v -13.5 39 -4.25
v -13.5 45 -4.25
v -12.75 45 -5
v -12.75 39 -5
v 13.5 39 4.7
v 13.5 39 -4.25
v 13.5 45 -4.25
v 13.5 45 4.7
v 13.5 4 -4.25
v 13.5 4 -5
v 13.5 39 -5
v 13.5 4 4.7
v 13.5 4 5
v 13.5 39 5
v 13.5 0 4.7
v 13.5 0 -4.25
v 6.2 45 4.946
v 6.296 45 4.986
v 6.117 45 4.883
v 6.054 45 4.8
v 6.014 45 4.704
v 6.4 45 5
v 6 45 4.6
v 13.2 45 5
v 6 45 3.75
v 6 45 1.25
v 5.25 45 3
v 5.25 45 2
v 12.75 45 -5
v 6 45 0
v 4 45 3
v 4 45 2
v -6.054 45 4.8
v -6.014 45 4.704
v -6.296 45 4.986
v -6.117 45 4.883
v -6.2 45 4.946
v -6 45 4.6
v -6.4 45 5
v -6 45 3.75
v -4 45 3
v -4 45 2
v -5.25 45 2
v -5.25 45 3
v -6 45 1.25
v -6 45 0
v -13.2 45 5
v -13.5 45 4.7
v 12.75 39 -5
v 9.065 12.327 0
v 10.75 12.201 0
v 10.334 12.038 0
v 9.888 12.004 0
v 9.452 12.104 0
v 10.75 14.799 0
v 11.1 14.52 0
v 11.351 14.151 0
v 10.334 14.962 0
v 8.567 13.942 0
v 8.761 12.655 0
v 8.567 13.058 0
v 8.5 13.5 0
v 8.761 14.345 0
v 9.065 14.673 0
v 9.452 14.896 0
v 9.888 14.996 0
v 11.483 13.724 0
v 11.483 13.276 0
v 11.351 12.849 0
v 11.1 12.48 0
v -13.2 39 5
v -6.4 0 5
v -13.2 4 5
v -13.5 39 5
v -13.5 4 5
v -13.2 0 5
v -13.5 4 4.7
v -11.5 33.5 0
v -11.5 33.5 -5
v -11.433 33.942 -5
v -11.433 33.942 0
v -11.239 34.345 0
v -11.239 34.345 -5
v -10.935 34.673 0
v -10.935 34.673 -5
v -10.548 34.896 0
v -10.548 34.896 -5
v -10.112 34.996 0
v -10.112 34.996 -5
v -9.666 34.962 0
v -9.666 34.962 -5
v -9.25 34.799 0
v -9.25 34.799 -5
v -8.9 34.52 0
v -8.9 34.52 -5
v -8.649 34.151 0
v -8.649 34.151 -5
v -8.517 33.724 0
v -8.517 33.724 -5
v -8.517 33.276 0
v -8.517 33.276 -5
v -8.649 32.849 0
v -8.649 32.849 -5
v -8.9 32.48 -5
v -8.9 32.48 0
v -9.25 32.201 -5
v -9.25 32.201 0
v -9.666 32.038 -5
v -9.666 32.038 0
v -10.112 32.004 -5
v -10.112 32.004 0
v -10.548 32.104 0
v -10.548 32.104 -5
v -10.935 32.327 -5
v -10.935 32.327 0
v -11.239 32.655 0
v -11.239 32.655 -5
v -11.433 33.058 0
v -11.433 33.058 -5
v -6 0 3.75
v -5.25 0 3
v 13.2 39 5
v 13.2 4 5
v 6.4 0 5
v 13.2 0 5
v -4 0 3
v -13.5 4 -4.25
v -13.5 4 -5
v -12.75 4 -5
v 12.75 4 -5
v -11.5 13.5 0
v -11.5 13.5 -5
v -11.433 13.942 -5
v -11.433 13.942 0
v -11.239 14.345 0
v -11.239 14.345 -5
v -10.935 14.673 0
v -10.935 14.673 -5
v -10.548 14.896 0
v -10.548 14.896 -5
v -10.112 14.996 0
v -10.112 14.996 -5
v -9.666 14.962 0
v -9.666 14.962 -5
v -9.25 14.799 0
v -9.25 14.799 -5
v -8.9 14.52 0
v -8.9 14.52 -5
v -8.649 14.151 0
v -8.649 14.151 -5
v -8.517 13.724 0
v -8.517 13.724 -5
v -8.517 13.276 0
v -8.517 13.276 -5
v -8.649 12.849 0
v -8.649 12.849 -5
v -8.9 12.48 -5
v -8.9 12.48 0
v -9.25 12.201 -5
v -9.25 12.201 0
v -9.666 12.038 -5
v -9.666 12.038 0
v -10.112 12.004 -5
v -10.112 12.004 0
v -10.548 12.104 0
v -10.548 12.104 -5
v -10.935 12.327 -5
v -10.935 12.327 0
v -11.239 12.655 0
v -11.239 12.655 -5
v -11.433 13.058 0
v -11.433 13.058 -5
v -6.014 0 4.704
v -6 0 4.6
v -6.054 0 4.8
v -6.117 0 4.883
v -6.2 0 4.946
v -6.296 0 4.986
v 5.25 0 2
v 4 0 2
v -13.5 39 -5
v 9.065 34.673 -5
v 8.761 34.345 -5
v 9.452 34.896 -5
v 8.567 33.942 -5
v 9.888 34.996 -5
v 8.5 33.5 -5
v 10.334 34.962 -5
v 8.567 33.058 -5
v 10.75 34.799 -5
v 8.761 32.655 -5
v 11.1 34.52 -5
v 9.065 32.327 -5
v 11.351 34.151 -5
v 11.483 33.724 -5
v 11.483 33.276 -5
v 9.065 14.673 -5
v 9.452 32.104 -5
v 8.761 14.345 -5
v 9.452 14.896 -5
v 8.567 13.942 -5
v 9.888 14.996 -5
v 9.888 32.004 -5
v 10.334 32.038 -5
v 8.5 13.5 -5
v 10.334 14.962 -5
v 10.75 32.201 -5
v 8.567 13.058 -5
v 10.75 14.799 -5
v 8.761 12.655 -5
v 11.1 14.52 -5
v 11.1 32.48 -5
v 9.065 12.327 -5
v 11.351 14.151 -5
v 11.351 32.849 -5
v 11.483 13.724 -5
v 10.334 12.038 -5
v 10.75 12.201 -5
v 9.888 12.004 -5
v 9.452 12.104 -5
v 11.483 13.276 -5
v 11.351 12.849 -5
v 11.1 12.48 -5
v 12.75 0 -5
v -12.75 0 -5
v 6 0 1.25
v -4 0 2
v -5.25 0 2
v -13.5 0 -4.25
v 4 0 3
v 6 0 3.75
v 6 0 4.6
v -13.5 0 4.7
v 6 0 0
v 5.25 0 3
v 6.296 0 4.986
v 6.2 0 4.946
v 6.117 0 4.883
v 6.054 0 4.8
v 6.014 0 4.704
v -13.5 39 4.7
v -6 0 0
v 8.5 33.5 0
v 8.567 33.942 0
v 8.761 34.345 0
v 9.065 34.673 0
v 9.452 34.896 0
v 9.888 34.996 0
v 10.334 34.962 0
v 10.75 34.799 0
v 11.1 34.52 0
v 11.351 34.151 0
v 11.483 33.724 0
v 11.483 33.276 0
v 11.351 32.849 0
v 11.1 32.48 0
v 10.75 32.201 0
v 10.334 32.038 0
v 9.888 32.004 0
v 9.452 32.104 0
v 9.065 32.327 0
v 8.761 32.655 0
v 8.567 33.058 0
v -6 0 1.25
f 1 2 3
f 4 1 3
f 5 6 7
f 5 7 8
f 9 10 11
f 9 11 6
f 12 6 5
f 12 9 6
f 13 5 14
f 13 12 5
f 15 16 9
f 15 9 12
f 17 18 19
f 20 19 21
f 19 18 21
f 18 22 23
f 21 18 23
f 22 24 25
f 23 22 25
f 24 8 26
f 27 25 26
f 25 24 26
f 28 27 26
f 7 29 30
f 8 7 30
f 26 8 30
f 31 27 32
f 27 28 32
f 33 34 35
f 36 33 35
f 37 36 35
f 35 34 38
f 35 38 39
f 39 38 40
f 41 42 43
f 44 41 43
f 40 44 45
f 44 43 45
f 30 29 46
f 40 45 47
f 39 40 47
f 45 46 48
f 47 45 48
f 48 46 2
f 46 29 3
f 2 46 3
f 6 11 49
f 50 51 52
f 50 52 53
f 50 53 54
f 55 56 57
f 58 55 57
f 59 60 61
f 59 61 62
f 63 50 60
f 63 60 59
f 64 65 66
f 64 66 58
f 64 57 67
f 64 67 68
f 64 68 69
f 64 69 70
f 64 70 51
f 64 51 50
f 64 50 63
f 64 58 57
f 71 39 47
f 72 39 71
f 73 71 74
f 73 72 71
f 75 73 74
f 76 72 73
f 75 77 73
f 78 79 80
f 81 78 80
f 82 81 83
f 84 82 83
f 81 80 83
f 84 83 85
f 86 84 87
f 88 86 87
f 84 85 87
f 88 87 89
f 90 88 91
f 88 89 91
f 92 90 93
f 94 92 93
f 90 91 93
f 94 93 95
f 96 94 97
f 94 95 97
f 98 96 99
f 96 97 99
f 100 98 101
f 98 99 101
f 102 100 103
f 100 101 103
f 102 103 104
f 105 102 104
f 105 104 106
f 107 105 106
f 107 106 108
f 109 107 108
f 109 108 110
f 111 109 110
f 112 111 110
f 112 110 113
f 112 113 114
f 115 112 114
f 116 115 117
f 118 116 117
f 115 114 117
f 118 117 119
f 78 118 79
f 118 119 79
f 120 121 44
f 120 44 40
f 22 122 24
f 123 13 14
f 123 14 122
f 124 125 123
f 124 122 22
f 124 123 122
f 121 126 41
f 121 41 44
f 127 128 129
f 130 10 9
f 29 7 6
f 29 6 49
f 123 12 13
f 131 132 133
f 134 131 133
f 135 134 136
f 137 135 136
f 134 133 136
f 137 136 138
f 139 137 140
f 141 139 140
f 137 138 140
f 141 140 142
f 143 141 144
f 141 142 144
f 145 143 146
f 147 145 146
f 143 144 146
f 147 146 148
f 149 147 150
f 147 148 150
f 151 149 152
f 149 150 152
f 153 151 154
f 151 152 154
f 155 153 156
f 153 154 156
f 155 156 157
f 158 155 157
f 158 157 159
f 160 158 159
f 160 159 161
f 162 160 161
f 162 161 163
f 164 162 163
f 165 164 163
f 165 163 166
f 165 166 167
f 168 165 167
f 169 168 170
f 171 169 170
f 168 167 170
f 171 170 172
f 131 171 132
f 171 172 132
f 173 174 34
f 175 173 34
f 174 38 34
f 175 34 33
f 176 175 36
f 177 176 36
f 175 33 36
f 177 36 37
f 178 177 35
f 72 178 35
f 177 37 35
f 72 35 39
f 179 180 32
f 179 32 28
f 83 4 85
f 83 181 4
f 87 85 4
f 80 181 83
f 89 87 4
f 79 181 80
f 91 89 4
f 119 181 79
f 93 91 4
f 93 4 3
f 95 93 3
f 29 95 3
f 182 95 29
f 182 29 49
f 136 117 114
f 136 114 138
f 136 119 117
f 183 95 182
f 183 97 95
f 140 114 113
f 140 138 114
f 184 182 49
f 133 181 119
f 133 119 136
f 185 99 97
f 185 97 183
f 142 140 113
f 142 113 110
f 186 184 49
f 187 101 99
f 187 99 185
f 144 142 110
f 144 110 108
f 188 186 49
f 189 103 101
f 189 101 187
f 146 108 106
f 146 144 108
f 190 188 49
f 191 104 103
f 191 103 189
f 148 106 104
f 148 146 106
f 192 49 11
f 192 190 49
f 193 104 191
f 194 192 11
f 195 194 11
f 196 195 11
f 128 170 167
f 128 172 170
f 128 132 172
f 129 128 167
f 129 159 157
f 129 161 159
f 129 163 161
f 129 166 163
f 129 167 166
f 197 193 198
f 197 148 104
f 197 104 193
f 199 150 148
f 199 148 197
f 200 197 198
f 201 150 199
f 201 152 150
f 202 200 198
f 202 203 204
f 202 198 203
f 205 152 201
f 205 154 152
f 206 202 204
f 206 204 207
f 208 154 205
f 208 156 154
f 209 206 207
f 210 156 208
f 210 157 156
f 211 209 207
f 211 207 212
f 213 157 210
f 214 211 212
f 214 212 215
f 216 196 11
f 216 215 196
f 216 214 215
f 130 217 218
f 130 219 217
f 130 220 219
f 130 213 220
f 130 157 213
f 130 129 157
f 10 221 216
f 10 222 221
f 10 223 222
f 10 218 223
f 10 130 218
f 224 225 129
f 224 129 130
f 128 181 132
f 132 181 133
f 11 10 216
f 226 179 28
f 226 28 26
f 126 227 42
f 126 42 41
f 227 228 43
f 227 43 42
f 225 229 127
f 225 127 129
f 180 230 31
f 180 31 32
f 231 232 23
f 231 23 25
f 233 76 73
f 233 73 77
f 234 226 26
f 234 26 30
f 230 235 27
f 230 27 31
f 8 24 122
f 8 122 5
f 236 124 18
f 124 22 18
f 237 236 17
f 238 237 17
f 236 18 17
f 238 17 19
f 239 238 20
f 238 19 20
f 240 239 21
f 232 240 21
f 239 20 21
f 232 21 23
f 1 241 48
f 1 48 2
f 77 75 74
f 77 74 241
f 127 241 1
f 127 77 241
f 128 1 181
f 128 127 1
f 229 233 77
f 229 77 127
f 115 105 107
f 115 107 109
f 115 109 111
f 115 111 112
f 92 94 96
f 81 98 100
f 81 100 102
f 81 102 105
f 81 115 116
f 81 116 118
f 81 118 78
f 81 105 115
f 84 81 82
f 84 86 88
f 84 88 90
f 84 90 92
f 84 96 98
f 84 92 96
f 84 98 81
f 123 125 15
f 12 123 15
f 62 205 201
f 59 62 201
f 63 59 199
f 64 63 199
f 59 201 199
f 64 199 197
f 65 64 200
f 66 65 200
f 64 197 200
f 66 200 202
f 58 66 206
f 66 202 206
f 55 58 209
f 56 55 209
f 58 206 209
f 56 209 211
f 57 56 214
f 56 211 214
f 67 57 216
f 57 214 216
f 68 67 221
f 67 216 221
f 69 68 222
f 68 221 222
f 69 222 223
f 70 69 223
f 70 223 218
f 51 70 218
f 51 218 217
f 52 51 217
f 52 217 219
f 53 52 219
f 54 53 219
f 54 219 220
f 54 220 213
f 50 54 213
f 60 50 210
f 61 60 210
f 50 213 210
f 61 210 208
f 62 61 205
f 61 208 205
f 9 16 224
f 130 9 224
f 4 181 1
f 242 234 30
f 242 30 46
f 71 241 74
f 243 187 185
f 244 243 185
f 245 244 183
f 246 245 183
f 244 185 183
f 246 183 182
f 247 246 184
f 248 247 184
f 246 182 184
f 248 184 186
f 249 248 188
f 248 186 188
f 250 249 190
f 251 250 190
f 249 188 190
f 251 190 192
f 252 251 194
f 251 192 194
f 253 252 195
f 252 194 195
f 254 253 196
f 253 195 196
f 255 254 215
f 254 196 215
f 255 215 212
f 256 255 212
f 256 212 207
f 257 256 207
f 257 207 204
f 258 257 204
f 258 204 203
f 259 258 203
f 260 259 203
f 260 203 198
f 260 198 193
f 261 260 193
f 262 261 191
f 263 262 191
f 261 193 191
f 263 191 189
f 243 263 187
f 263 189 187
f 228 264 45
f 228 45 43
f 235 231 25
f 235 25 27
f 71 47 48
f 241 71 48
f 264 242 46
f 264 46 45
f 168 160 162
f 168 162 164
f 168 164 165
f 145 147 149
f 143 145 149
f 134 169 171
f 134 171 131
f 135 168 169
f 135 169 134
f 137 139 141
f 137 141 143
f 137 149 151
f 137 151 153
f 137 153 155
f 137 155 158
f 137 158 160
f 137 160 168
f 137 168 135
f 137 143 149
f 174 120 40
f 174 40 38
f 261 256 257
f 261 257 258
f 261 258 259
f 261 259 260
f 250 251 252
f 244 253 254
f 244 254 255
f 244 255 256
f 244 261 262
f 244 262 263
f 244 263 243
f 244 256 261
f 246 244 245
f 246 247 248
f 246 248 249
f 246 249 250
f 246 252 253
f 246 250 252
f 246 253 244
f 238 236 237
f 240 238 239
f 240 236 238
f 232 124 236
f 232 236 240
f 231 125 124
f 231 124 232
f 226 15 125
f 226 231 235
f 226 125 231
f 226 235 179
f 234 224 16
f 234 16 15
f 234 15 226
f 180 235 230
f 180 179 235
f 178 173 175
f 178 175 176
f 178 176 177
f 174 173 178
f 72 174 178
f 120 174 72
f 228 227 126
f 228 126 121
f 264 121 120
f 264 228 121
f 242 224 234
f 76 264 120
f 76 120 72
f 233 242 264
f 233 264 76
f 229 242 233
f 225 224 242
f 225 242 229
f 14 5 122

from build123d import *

# Parameters (mm, degrees)
BOSS_EXTRUDE1_DEPTH = 45
FILLET1_R           = 0.4
SKETCH3_R           = 1.5
CUT_EXTRUDE3_DEPTH  = 5
CUT_EXTRUDE5_DEPTH  = 6


with BuildPart() as part:
    # Sketch2 → Boss-Extrude1 (new body)
    with BuildSketch(Plane(origin=(0, 0, 0), x_dir=(1, 0, 0), z_dir=(0, 1, 0))):
        Polygon((-13.5, 5), (13.5, 5), (13.5, -5), (6, -5), (6, -3.75), (5.25, -3), (4, -3), (4, -2), (5.25, -2), (6, -1.25), (6, 0), (-6, 0), (-6, -1.25), (-5.25, -2), (-4, -2), (-4, -3), (-5.25, -3), (-6, -3.75), (-6, -5), (-13.5, -5), align=None)
    extrude(amount=BOSS_EXTRUDE1_DEPTH)

    # Fillet1
    fillet1_edges = [part.edges().sort_by_distance(p)[0] for p in [
        (6, 22.5, 5),
        (-6, 22.5, 5),
    ]]
    fillet(fillet1_edges, radius=FILLET1_R)

    # Sketch3 → Cut-Extrude3 (cut)
    with BuildSketch(Plane(origin=(0, 0, -5), x_dir=(-1, 0, 0), z_dir=(0, 0, -1))):
        with Locations((10, 33.5)):
            Circle(SKETCH3_R)
        with Locations((-10, 33.5)):
            Circle(SKETCH3_R)
        with Locations((-10, 13.5)):
            Circle(SKETCH3_R)
        with Locations((10, 13.5)):
            Circle(SKETCH3_R)
    extrude(amount=-CUT_EXTRUDE3_DEPTH, mode=Mode.SUBTRACT)

    # Sketch4 → Cut-Extrude5 (cut)
    with BuildSketch(Plane(origin=(0, 45, 0), x_dir=(1, 0, 0), z_dir=(0, 1, 0))):
        Polygon((-13.5, 5), (-13.5, 4.25), (-12.75, 5), align=None)
        Polygon((13.5, 4.25), (12.75, 5), (13.5, 5), align=None)
        Polygon((-13.5, -5), (-13.2, -5), (-13.5, -4.7), align=None)
        Polygon((13.2, -5), (13.5, -4.7), (13.5, -5), align=None)
    cut_extrude5 = extrude(amount=-CUT_EXTRUDE5_DEPTH, mode=Mode.SUBTRACT)

    # Mirror1: Cut-Extrude5 across plane
    add(cut_extrude5.mirror(Plane.ZX.offset(21.5)), mode=Mode.SUBTRACT)


solid = part.part
